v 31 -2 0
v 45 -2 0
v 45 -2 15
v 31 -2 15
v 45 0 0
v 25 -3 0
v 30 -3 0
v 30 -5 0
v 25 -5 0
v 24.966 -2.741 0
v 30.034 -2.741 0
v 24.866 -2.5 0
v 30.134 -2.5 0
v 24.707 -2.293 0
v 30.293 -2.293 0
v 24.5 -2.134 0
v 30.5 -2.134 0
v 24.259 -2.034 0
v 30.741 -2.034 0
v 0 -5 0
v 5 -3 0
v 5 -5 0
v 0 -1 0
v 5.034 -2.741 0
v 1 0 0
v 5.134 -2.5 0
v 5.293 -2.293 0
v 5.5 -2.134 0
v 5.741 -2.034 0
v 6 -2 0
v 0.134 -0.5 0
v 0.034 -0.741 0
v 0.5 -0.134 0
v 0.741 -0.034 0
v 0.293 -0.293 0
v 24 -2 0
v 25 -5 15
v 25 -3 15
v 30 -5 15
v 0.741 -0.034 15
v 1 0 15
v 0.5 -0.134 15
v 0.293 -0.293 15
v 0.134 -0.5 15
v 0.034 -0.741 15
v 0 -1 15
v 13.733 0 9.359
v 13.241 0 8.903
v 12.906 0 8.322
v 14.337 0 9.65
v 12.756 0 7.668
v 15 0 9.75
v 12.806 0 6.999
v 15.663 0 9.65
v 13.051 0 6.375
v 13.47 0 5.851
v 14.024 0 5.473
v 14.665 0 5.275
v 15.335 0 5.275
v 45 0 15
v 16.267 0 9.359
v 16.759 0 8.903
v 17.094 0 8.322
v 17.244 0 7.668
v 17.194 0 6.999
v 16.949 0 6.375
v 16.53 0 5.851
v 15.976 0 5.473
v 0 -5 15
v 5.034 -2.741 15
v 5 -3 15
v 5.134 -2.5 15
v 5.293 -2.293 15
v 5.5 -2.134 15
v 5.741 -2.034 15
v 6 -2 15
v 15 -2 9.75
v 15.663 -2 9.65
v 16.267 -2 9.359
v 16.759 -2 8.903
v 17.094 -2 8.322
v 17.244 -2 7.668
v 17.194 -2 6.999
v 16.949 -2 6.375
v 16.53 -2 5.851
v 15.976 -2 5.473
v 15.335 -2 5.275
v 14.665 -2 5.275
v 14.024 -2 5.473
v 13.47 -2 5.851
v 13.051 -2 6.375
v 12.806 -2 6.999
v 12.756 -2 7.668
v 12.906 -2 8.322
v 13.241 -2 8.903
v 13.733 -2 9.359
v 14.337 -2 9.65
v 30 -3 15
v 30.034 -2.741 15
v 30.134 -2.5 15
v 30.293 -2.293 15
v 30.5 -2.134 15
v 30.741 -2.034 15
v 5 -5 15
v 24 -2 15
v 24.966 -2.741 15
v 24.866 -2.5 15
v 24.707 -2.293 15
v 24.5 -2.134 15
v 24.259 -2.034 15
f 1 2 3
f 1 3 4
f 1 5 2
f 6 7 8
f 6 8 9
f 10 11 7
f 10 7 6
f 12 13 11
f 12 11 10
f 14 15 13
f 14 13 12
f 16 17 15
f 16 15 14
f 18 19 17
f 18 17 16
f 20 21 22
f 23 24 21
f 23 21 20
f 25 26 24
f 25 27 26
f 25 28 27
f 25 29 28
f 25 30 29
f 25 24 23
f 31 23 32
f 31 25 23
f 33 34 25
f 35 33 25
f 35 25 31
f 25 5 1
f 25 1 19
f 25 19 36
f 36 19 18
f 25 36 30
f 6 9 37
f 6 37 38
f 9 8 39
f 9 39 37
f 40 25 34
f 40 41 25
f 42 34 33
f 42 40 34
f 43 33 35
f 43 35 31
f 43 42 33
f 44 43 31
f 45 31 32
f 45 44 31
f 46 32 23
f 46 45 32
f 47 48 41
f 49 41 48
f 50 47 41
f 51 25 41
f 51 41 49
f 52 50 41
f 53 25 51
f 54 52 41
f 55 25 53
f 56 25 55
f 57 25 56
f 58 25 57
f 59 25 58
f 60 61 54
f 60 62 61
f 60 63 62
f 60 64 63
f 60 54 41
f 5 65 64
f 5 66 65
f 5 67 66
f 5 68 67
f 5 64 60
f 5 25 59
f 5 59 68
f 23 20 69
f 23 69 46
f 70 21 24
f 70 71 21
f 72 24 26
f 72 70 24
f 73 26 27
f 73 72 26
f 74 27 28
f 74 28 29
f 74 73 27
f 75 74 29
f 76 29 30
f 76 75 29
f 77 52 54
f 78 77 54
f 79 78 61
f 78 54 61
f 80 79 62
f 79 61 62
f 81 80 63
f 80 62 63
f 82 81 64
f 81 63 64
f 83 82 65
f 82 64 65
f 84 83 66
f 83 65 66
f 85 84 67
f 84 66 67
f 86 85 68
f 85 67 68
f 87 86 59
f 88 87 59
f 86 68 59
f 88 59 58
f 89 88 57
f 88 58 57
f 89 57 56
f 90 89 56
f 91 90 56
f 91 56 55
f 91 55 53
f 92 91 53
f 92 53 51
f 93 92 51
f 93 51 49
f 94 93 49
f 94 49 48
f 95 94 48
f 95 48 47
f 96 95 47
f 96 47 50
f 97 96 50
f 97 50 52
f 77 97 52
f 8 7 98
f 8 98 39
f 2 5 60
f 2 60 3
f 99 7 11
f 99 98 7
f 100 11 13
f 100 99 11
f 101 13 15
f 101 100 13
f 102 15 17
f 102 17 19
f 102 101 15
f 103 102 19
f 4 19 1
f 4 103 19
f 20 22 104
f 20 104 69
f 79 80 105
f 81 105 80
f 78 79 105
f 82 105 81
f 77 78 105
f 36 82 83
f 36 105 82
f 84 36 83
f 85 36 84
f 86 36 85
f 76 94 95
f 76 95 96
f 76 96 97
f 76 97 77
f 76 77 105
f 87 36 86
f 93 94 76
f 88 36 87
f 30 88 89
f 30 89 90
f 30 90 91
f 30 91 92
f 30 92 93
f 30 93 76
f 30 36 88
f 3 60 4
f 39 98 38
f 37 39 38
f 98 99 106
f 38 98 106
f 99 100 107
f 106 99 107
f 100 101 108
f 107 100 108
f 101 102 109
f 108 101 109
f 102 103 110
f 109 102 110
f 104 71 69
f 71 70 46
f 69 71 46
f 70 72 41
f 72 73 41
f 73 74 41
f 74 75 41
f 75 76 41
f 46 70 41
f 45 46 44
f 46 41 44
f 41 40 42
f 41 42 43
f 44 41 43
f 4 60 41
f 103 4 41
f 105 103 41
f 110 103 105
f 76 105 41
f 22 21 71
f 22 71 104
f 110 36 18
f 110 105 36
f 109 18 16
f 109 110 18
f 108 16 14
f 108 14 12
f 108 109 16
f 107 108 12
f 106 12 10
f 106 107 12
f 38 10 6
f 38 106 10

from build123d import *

# Parameters (mm, degrees)
BOSS_EXTRUDE1_DEPTH = 15
FILLET1_R           = 1
FILLET2_R           = 1
FILLET3_R           = 1
FILLET4_R           = 1
SKETCH2_R           = 2.25
CUT_EXTRUDE1_DEPTH  = 5


with BuildPart() as part:
    # Sketch1 → Boss-Extrude1 (new body)
    with BuildSketch(Plane.XY):
        Polygon((0, 0), (45, 0), (45, -2), (30, -2), (30, -5), (25, -5), (25, -2), (5, -2), (5, -5), (0, -5), align=None)
    extrude(amount=BOSS_EXTRUDE1_DEPTH)

    # Fillet1
    fillet1_edges = [part.edges().sort_by_distance(p)[0] for p in [
        (0, 0, 7.5),
    ]]
    fillet(fillet1_edges, radius=FILLET1_R)

    # Fillet2
    fillet2_edges = [part.edges().sort_by_distance(p)[0] for p in [
        (5, -2, 7.5),
    ]]
    fillet(fillet2_edges, radius=FILLET2_R)

    # Fillet3
    fillet3_edges = [part.edges().sort_by_distance(p)[0] for p in [
        (25, -2, 7.5),
    ]]
    fillet(fillet3_edges, radius=FILLET3_R)

    # Fillet4
    fillet4_edges = [part.edges().sort_by_distance(p)[0] for p in [
        (30, -2, 7.5),
    ]]
    fillet(fillet4_edges, radius=FILLET4_R)

    # Sketch2 → Cut-Extrude1 (cut)
    with BuildSketch(Plane(origin=(0, 0, 0), x_dir=(1, 0, 0), z_dir=(0, 1, 0))):
        with Locations(Location((15, -7.5, 0), (0, 0, 270))):
            Circle(SKETCH2_R)
    extrude(amount=-CUT_EXTRUDE1_DEPTH, mode=Mode.SUBTRACT)


solid = part.part
